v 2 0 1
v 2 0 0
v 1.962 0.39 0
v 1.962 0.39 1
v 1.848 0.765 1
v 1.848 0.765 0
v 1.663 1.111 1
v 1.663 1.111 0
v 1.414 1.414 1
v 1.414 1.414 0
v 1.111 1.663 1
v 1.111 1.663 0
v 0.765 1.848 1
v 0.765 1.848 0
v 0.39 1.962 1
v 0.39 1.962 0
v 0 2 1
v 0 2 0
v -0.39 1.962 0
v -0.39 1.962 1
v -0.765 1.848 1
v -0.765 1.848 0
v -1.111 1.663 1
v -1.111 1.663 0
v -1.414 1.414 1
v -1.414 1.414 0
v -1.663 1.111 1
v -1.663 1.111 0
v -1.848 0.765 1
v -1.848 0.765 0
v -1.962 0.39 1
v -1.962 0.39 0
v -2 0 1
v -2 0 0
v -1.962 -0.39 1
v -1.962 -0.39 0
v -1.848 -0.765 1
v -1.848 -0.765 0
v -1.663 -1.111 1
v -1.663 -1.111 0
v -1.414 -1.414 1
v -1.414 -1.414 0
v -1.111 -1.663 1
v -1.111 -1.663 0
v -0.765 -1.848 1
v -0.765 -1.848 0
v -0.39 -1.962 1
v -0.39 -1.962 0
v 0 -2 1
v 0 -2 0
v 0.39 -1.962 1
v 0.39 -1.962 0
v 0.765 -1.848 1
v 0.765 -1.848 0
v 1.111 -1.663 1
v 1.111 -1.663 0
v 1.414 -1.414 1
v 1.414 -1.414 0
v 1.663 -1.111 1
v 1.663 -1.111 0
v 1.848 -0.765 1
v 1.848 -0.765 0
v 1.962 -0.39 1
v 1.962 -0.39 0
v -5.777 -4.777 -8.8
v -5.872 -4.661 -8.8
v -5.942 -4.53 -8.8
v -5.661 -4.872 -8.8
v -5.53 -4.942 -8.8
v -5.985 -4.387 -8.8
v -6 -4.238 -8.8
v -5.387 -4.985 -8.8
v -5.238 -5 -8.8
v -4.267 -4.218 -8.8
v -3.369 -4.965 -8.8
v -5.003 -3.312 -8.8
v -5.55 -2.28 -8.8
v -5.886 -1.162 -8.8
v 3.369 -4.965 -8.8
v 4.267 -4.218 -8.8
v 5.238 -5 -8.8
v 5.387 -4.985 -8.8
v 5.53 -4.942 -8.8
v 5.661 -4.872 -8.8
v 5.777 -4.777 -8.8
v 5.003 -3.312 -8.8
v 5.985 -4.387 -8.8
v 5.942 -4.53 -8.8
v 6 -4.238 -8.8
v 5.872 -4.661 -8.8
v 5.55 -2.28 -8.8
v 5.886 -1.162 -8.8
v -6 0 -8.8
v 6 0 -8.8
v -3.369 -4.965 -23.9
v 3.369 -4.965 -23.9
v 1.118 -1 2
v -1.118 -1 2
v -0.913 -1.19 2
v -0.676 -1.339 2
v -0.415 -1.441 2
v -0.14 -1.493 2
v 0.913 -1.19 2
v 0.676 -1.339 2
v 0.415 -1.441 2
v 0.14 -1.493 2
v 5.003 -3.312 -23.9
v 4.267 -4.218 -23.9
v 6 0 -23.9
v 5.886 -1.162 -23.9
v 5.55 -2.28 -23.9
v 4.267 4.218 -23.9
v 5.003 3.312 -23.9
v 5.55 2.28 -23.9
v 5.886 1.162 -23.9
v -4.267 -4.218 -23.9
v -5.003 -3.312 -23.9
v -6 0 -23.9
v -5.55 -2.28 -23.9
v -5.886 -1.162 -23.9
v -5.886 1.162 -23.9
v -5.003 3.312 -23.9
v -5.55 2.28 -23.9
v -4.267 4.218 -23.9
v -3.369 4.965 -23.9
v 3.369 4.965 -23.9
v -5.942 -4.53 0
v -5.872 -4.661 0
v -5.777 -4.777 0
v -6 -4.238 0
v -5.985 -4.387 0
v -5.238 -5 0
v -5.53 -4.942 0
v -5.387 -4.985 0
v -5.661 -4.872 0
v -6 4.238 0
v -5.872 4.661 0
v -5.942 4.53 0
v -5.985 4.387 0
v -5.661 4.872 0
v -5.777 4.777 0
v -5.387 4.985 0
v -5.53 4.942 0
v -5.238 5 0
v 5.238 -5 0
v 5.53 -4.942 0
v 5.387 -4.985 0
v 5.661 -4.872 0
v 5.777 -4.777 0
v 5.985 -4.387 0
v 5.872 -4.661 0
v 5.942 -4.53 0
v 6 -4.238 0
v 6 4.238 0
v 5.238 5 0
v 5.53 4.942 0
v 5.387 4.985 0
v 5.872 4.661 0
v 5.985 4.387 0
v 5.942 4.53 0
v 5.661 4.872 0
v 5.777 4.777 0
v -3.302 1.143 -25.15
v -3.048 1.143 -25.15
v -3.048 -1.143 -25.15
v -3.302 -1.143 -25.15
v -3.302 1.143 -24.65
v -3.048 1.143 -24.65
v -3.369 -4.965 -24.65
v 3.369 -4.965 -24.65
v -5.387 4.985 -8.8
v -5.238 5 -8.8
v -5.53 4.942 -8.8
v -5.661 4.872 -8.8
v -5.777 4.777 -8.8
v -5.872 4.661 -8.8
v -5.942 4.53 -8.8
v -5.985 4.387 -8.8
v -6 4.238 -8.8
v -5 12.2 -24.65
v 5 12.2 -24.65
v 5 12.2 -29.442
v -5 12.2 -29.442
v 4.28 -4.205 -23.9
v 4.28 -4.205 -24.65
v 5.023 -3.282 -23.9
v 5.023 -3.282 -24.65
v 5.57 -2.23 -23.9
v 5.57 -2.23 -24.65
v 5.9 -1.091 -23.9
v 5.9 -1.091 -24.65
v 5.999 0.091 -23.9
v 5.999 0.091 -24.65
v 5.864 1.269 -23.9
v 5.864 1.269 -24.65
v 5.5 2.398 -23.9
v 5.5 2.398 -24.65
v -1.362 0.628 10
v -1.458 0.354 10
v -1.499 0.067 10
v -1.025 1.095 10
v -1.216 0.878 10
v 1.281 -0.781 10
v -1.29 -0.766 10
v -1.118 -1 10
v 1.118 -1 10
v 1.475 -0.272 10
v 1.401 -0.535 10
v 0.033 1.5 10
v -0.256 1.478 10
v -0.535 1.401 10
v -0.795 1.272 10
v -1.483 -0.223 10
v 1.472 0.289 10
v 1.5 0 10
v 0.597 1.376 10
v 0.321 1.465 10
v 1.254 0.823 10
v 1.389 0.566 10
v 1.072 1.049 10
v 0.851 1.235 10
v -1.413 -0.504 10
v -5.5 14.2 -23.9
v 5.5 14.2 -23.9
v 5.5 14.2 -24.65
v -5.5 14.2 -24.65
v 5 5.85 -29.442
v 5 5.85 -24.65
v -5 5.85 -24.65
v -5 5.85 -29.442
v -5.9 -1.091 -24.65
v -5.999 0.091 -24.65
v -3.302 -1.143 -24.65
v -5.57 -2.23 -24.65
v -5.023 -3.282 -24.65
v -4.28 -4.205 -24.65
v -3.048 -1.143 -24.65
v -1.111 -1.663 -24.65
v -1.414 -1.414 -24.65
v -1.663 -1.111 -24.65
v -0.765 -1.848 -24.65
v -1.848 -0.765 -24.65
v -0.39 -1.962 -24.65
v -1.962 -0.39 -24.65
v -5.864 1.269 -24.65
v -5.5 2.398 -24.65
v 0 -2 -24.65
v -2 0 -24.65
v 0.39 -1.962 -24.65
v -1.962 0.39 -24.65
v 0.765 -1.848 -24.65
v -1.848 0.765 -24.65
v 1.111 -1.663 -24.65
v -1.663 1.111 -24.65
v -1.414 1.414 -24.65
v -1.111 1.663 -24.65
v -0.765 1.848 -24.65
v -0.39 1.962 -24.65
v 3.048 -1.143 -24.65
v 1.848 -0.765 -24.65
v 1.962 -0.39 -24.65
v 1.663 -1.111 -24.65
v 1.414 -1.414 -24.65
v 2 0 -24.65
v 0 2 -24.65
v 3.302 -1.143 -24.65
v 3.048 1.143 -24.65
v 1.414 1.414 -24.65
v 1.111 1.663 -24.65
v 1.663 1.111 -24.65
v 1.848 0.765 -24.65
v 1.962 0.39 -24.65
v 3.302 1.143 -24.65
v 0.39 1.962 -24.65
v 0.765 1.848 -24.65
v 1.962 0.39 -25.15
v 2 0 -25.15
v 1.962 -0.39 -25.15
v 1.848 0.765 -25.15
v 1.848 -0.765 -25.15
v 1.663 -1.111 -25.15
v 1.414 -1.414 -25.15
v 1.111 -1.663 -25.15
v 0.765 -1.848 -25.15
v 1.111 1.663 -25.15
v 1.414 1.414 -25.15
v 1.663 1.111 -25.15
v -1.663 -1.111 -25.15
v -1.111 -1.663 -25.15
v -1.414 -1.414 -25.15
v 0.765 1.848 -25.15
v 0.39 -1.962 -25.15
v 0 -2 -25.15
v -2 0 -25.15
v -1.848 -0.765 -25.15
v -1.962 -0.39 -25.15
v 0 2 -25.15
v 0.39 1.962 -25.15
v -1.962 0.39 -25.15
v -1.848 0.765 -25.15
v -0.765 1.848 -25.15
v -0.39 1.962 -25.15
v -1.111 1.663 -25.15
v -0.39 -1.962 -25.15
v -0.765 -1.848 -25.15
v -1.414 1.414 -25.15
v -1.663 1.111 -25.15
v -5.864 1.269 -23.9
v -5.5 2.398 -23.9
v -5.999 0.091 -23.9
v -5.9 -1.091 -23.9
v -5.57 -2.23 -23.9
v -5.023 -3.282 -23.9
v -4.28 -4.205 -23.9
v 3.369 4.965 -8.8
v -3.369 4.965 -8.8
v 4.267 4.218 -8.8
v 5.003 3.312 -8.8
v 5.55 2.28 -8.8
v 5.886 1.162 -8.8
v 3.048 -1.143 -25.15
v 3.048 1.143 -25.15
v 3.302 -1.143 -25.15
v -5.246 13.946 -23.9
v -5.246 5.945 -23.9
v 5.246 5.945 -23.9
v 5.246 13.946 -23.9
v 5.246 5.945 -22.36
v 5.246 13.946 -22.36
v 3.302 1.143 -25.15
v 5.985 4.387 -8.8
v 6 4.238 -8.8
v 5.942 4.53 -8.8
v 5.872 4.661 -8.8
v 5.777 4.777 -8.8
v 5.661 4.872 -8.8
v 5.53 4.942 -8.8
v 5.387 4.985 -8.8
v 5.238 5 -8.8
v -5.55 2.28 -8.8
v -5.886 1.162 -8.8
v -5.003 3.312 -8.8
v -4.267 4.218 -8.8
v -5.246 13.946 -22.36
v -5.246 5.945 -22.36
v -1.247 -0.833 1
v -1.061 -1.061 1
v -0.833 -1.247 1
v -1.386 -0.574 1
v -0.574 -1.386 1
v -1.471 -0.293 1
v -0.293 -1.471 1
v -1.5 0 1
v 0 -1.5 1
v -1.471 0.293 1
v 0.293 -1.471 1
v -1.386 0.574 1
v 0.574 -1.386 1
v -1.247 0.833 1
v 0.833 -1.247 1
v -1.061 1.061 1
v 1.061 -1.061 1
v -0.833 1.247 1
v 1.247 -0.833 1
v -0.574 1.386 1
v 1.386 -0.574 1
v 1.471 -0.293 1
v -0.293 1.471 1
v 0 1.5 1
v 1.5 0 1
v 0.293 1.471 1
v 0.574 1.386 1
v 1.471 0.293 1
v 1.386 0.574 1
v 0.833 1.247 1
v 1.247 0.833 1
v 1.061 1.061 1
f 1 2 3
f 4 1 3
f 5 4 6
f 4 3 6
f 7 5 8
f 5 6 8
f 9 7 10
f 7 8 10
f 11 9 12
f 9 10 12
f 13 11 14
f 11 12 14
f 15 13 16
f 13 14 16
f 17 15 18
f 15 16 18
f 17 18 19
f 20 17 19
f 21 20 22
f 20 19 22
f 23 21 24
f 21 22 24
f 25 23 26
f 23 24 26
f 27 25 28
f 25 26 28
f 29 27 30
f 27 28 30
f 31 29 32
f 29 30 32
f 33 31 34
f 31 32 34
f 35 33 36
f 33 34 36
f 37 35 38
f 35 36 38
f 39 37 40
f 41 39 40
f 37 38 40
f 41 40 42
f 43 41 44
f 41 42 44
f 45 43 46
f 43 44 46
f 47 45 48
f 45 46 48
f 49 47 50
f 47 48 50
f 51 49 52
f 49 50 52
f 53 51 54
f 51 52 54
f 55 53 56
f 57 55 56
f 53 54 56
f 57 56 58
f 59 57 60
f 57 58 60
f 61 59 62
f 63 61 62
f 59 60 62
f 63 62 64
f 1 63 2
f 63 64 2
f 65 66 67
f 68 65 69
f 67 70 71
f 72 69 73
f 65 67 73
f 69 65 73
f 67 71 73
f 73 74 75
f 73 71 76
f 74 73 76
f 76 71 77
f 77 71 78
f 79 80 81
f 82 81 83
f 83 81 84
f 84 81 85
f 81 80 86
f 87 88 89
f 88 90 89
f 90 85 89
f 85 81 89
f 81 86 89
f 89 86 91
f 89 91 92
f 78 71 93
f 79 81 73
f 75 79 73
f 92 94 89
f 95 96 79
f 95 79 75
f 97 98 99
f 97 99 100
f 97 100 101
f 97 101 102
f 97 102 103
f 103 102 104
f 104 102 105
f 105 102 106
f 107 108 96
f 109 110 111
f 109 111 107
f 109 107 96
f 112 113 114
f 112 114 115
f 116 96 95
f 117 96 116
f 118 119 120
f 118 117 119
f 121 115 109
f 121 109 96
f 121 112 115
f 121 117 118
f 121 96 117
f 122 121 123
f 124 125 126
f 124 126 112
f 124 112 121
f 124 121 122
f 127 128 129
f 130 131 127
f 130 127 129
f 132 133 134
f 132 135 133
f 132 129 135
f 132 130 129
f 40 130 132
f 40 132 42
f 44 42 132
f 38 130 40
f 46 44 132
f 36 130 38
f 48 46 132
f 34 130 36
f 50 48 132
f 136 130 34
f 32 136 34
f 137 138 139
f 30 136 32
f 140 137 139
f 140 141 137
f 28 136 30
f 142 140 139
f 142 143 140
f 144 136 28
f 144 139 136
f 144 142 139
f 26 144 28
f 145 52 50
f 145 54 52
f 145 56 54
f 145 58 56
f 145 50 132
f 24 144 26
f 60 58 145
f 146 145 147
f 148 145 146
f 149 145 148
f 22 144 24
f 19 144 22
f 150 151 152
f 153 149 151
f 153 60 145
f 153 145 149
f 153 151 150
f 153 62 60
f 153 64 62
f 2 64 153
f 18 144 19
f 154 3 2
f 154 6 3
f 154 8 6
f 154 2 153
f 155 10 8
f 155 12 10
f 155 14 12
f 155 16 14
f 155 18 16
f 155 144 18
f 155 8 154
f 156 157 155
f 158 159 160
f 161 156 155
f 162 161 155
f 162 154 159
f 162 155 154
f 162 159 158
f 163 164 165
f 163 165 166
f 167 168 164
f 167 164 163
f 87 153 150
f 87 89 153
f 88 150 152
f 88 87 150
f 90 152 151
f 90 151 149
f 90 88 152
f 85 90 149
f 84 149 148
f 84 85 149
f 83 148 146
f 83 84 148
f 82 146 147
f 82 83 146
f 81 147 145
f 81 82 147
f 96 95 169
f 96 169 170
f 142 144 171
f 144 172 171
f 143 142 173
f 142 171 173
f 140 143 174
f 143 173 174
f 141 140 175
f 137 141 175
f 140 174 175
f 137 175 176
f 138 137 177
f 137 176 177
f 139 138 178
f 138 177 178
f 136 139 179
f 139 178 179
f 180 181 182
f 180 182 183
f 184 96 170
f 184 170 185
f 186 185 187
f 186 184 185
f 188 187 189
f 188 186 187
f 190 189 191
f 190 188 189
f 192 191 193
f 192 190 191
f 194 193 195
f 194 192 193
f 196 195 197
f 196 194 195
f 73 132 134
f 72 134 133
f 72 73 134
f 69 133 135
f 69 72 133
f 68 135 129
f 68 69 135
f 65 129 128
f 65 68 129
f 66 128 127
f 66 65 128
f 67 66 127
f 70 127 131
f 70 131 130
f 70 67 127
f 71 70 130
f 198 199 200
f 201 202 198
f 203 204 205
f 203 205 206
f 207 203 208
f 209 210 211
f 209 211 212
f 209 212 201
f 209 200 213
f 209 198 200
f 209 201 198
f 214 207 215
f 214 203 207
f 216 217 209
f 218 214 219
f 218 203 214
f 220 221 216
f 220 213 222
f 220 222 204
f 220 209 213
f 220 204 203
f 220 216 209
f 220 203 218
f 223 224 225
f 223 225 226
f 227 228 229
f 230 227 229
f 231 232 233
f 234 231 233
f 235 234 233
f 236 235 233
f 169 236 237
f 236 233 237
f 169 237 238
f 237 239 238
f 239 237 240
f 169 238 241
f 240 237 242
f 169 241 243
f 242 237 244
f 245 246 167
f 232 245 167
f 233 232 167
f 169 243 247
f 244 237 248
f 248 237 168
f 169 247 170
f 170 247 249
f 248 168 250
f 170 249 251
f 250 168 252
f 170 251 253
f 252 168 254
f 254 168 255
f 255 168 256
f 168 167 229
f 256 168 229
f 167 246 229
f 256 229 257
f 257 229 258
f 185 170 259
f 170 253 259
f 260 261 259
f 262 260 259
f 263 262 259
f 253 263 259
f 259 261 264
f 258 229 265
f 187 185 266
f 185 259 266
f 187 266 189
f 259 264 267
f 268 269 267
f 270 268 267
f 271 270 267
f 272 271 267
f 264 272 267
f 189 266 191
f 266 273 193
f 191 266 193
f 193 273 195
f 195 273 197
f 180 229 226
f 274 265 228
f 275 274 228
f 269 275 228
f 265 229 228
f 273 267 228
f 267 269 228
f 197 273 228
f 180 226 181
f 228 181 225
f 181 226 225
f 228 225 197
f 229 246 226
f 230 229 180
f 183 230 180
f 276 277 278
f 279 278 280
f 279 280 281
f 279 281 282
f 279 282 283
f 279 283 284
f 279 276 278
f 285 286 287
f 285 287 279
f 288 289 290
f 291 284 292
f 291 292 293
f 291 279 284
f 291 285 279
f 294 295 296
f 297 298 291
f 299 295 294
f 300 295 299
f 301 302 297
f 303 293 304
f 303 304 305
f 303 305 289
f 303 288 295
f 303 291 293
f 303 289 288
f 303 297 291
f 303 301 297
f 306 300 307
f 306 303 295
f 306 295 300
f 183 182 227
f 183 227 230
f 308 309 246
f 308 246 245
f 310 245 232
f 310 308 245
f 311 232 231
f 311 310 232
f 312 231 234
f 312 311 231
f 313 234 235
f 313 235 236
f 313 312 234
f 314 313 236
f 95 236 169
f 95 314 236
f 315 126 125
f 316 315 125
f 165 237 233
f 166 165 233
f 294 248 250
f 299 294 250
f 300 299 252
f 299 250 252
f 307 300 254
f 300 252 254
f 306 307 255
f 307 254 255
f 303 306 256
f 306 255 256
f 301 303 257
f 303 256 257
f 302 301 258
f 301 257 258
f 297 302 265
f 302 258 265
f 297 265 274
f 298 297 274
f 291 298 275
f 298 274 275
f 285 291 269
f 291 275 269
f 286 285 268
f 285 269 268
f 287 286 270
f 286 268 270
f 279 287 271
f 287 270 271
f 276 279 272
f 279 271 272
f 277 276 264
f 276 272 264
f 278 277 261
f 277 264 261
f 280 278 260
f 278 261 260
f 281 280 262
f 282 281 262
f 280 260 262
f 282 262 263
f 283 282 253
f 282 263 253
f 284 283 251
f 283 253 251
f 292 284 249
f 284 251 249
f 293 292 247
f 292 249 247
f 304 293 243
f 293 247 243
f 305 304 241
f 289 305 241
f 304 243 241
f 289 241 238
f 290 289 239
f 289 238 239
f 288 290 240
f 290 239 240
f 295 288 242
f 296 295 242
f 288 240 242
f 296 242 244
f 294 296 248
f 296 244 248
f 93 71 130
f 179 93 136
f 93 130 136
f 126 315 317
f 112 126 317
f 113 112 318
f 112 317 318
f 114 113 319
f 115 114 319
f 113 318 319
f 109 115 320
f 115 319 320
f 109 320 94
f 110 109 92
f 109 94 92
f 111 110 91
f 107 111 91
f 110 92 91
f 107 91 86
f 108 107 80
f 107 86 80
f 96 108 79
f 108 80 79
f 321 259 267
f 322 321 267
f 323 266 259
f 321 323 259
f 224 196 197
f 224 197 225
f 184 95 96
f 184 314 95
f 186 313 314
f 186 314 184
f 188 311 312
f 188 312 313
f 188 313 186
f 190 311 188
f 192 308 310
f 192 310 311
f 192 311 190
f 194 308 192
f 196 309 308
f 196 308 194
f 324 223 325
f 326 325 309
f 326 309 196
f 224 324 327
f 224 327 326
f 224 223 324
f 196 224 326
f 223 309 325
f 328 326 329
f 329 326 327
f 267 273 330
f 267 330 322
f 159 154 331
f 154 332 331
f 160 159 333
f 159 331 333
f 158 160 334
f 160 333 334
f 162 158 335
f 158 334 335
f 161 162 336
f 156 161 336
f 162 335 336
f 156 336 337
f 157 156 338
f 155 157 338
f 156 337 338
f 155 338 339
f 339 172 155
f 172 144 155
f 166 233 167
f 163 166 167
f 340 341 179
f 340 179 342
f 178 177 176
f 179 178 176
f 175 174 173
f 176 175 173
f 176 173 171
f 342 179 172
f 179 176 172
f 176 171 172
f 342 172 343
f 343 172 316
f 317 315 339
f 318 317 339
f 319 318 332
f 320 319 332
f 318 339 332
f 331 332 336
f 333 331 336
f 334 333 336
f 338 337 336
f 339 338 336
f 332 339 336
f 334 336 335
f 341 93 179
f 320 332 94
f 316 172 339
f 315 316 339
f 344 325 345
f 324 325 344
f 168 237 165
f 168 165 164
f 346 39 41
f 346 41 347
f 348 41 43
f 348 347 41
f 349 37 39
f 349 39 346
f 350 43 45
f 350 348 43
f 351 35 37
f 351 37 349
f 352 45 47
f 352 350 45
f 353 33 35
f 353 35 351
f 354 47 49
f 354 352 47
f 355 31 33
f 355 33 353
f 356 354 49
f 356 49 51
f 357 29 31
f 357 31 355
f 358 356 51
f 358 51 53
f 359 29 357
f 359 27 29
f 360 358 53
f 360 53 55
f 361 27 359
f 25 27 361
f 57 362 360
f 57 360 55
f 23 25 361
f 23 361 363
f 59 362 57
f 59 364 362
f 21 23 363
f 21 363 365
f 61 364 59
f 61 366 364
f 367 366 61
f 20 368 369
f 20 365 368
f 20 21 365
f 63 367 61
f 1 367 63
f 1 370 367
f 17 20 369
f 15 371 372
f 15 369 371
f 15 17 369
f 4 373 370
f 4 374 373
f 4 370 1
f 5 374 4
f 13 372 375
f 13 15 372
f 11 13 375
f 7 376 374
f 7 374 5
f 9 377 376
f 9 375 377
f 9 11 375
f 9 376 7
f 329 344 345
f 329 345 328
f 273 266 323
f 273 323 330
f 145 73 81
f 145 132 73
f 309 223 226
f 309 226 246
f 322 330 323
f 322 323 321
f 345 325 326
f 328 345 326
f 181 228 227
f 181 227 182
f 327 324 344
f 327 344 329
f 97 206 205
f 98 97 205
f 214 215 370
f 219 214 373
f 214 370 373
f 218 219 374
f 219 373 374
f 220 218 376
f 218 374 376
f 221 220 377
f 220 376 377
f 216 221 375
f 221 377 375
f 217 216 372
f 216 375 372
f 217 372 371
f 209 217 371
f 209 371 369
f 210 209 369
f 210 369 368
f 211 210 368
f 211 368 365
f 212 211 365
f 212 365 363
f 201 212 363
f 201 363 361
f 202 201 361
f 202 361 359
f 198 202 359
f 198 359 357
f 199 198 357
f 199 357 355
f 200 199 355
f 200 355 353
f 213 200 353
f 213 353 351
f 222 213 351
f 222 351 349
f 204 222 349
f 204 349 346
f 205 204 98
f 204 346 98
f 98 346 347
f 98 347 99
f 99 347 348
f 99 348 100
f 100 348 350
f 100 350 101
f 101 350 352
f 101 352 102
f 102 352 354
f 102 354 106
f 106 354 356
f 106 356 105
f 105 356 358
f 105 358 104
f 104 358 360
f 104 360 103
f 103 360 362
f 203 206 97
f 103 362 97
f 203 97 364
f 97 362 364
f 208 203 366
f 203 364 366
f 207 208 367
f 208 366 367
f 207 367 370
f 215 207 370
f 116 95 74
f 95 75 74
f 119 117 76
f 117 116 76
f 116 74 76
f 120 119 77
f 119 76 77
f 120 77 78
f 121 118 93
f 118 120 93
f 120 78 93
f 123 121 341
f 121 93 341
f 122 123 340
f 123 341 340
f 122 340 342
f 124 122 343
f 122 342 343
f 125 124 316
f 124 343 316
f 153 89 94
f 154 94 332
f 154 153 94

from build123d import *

# Parameters (mm, degrees)
SKETCH1_W           = 12
SKETCH1_H           = 10
BOSS_EXTRUDE1_DEPTH = 8.8
SKETCH2_R           = 2
BOSS_EXTRUDE2_DEPTH = 1
SKETCH3_R           = 1.5
BOSS_EXTRUDE3_DEPTH = 9
CUT_EXTRUDE1_DEPTH  = 8
SKETCH5_R           = 6
BOSS_EXTRUDE4_DEPTH = 15.1
CUT_EXTRUDE2_DEPTH  = 15.1
BOSS_EXTRUDE5_DEPTH = 0.75
SKETCH8_R           = 2
SKETCH8_W           = 0.254
SKETCH8_H           = 2.286
BOSS_EXTRUDE6_DEPTH = 0.5
SKETCH9_W           = 10.492
SKETCH9_H           = 8.001
BOSS_EXTRUDE7_DEPTH = 1.54
SKETCH10_W          = 10
SKETCH10_H          = 6.35
BOSS_EXTRUDE8_DEPTH = 4.792000068
FILLET1_R           = 0.762


with BuildPart() as part:
    # Sketch1 → Boss-Extrude1 (new body)
    with BuildSketch(Plane.XY):
        Rectangle(SKETCH1_W, SKETCH1_H)
    extrude(amount=-BOSS_EXTRUDE1_DEPTH)

    # Sketch2 → Boss-Extrude2 (add)
    with BuildSketch(Plane.XY):
        Circle(SKETCH2_R)
    extrude(amount=BOSS_EXTRUDE2_DEPTH)

    # Sketch3 → Boss-Extrude3 (add)
    with BuildSketch(Plane.XY.offset(1)):
        Circle(SKETCH3_R)
    extrude(amount=BOSS_EXTRUDE3_DEPTH)

    # Sketch4 → Cut-Extrude1 (cut)
    with BuildSketch(Plane.XY.offset(10)):
        with BuildLine():
            Line((1.118033989, -1), (-1.118033989, -1))
            ThreePointArc((-1.118033989, -1), (0, -1.5), (1.118033989, -1))
        make_face()
    extrude(amount=-CUT_EXTRUDE1_DEPTH, mode=Mode.SUBTRACT)

    # Sketch5 → Boss-Extrude4 (add)
    with BuildSketch(Plane(origin=(0, 0, -8.8), x_dir=(-1, 0, 0), z_dir=(0, 0, -1))):
        Circle(SKETCH5_R)
    extrude(amount=BOSS_EXTRUDE4_DEPTH)

    # Sketch6 → Cut-Extrude2 (cut)
    with BuildSketch(Plane(origin=(0, 0, -23.9), x_dir=(-1, 0, 0), z_dir=(0, 0, -1))):
        with BuildLine():
            Line((-3.368794295, 4.965), (3.368794295, 4.965))
            ThreePointArc((3.368794295, 4.965), (0, 6), (-3.368794295, 4.965))
        make_face()
        with BuildLine():
            Line((-3.368794295, -4.965), (3.368794295, -4.965))
            ThreePointArc((3.368794295, -4.965), (0, -6), (-3.368794295, -4.965))
        make_face()
    extrude(amount=-CUT_EXTRUDE2_DEPTH, mode=Mode.SUBTRACT)

    # Fillet1
    fillet1_edges = [part.edges().sort_by_distance(p)[0] for p in [
        (6, -5, -4.4),
        (-6, -5, -4.4),
        (-6, 5, -4.4),
        (6, 5, -4.4),
    ]]
    fillet(fillet1_edges, radius=FILLET1_R)


with BuildPart() as body_2:
    # Sketch7 → Boss-Extrude5 (new body)
    with BuildSketch(Plane(origin=(0, 0, -23.9), x_dir=(-1, 0, 0), z_dir=(0, 0, -1))):
        with BuildLine():
            Line((3.368794295, -4.965), (-3.368794295, -4.965))
            ThreePointArc((-3.368794295, -4.965), (-5.763420008, -1.668229544), (-5.5, 2.397915762))
            Line((-5.5, 2.397915762), (-5.5, 14.2))
            Line((-5.5, 14.2), (5.5, 14.2))
            Line((5.5, 14.2), (5.5, 2.397915762))
            ThreePointArc((5.5, 2.397915762), (5.763420008, -1.668229544), (3.368794295, -4.965))
        make_face()
    extrude(amount=BOSS_EXTRUDE5_DEPTH)

    # Sketch8 → Boss-Extrude6 (add)
    with BuildSketch(Plane(origin=(0, 0, -24.65), x_dir=(-1, 0, 0), z_dir=(0, 0, -1))):
        Circle(SKETCH8_R)
        with Locations((-3.175, 0)):
            Rectangle(SKETCH8_W, SKETCH8_H)
        with Locations((3.175, 0)):
            Rectangle(SKETCH8_W, SKETCH8_H)
    extrude(amount=BOSS_EXTRUDE6_DEPTH)

    # Sketch9 → Boss-Extrude7 (add)
    with BuildSketch(Plane.XY.offset(-23.9)):
        with Locations((0, 9.9455)):
            Rectangle(SKETCH9_W, SKETCH9_H)
    extrude(amount=BOSS_EXTRUDE7_DEPTH)

    # Sketch10 → Boss-Extrude8 (add)
    with BuildSketch(Plane(origin=(0, 0, -24.65), x_dir=(-1, 0, 0), z_dir=(0, 0, -1))):
        with Locations((0, 9.025)):
            Rectangle(SKETCH10_W, SKETCH10_H)
    extrude(amount=BOSS_EXTRUDE8_DEPTH)


solid = Compound([part.part, body_2.part])
